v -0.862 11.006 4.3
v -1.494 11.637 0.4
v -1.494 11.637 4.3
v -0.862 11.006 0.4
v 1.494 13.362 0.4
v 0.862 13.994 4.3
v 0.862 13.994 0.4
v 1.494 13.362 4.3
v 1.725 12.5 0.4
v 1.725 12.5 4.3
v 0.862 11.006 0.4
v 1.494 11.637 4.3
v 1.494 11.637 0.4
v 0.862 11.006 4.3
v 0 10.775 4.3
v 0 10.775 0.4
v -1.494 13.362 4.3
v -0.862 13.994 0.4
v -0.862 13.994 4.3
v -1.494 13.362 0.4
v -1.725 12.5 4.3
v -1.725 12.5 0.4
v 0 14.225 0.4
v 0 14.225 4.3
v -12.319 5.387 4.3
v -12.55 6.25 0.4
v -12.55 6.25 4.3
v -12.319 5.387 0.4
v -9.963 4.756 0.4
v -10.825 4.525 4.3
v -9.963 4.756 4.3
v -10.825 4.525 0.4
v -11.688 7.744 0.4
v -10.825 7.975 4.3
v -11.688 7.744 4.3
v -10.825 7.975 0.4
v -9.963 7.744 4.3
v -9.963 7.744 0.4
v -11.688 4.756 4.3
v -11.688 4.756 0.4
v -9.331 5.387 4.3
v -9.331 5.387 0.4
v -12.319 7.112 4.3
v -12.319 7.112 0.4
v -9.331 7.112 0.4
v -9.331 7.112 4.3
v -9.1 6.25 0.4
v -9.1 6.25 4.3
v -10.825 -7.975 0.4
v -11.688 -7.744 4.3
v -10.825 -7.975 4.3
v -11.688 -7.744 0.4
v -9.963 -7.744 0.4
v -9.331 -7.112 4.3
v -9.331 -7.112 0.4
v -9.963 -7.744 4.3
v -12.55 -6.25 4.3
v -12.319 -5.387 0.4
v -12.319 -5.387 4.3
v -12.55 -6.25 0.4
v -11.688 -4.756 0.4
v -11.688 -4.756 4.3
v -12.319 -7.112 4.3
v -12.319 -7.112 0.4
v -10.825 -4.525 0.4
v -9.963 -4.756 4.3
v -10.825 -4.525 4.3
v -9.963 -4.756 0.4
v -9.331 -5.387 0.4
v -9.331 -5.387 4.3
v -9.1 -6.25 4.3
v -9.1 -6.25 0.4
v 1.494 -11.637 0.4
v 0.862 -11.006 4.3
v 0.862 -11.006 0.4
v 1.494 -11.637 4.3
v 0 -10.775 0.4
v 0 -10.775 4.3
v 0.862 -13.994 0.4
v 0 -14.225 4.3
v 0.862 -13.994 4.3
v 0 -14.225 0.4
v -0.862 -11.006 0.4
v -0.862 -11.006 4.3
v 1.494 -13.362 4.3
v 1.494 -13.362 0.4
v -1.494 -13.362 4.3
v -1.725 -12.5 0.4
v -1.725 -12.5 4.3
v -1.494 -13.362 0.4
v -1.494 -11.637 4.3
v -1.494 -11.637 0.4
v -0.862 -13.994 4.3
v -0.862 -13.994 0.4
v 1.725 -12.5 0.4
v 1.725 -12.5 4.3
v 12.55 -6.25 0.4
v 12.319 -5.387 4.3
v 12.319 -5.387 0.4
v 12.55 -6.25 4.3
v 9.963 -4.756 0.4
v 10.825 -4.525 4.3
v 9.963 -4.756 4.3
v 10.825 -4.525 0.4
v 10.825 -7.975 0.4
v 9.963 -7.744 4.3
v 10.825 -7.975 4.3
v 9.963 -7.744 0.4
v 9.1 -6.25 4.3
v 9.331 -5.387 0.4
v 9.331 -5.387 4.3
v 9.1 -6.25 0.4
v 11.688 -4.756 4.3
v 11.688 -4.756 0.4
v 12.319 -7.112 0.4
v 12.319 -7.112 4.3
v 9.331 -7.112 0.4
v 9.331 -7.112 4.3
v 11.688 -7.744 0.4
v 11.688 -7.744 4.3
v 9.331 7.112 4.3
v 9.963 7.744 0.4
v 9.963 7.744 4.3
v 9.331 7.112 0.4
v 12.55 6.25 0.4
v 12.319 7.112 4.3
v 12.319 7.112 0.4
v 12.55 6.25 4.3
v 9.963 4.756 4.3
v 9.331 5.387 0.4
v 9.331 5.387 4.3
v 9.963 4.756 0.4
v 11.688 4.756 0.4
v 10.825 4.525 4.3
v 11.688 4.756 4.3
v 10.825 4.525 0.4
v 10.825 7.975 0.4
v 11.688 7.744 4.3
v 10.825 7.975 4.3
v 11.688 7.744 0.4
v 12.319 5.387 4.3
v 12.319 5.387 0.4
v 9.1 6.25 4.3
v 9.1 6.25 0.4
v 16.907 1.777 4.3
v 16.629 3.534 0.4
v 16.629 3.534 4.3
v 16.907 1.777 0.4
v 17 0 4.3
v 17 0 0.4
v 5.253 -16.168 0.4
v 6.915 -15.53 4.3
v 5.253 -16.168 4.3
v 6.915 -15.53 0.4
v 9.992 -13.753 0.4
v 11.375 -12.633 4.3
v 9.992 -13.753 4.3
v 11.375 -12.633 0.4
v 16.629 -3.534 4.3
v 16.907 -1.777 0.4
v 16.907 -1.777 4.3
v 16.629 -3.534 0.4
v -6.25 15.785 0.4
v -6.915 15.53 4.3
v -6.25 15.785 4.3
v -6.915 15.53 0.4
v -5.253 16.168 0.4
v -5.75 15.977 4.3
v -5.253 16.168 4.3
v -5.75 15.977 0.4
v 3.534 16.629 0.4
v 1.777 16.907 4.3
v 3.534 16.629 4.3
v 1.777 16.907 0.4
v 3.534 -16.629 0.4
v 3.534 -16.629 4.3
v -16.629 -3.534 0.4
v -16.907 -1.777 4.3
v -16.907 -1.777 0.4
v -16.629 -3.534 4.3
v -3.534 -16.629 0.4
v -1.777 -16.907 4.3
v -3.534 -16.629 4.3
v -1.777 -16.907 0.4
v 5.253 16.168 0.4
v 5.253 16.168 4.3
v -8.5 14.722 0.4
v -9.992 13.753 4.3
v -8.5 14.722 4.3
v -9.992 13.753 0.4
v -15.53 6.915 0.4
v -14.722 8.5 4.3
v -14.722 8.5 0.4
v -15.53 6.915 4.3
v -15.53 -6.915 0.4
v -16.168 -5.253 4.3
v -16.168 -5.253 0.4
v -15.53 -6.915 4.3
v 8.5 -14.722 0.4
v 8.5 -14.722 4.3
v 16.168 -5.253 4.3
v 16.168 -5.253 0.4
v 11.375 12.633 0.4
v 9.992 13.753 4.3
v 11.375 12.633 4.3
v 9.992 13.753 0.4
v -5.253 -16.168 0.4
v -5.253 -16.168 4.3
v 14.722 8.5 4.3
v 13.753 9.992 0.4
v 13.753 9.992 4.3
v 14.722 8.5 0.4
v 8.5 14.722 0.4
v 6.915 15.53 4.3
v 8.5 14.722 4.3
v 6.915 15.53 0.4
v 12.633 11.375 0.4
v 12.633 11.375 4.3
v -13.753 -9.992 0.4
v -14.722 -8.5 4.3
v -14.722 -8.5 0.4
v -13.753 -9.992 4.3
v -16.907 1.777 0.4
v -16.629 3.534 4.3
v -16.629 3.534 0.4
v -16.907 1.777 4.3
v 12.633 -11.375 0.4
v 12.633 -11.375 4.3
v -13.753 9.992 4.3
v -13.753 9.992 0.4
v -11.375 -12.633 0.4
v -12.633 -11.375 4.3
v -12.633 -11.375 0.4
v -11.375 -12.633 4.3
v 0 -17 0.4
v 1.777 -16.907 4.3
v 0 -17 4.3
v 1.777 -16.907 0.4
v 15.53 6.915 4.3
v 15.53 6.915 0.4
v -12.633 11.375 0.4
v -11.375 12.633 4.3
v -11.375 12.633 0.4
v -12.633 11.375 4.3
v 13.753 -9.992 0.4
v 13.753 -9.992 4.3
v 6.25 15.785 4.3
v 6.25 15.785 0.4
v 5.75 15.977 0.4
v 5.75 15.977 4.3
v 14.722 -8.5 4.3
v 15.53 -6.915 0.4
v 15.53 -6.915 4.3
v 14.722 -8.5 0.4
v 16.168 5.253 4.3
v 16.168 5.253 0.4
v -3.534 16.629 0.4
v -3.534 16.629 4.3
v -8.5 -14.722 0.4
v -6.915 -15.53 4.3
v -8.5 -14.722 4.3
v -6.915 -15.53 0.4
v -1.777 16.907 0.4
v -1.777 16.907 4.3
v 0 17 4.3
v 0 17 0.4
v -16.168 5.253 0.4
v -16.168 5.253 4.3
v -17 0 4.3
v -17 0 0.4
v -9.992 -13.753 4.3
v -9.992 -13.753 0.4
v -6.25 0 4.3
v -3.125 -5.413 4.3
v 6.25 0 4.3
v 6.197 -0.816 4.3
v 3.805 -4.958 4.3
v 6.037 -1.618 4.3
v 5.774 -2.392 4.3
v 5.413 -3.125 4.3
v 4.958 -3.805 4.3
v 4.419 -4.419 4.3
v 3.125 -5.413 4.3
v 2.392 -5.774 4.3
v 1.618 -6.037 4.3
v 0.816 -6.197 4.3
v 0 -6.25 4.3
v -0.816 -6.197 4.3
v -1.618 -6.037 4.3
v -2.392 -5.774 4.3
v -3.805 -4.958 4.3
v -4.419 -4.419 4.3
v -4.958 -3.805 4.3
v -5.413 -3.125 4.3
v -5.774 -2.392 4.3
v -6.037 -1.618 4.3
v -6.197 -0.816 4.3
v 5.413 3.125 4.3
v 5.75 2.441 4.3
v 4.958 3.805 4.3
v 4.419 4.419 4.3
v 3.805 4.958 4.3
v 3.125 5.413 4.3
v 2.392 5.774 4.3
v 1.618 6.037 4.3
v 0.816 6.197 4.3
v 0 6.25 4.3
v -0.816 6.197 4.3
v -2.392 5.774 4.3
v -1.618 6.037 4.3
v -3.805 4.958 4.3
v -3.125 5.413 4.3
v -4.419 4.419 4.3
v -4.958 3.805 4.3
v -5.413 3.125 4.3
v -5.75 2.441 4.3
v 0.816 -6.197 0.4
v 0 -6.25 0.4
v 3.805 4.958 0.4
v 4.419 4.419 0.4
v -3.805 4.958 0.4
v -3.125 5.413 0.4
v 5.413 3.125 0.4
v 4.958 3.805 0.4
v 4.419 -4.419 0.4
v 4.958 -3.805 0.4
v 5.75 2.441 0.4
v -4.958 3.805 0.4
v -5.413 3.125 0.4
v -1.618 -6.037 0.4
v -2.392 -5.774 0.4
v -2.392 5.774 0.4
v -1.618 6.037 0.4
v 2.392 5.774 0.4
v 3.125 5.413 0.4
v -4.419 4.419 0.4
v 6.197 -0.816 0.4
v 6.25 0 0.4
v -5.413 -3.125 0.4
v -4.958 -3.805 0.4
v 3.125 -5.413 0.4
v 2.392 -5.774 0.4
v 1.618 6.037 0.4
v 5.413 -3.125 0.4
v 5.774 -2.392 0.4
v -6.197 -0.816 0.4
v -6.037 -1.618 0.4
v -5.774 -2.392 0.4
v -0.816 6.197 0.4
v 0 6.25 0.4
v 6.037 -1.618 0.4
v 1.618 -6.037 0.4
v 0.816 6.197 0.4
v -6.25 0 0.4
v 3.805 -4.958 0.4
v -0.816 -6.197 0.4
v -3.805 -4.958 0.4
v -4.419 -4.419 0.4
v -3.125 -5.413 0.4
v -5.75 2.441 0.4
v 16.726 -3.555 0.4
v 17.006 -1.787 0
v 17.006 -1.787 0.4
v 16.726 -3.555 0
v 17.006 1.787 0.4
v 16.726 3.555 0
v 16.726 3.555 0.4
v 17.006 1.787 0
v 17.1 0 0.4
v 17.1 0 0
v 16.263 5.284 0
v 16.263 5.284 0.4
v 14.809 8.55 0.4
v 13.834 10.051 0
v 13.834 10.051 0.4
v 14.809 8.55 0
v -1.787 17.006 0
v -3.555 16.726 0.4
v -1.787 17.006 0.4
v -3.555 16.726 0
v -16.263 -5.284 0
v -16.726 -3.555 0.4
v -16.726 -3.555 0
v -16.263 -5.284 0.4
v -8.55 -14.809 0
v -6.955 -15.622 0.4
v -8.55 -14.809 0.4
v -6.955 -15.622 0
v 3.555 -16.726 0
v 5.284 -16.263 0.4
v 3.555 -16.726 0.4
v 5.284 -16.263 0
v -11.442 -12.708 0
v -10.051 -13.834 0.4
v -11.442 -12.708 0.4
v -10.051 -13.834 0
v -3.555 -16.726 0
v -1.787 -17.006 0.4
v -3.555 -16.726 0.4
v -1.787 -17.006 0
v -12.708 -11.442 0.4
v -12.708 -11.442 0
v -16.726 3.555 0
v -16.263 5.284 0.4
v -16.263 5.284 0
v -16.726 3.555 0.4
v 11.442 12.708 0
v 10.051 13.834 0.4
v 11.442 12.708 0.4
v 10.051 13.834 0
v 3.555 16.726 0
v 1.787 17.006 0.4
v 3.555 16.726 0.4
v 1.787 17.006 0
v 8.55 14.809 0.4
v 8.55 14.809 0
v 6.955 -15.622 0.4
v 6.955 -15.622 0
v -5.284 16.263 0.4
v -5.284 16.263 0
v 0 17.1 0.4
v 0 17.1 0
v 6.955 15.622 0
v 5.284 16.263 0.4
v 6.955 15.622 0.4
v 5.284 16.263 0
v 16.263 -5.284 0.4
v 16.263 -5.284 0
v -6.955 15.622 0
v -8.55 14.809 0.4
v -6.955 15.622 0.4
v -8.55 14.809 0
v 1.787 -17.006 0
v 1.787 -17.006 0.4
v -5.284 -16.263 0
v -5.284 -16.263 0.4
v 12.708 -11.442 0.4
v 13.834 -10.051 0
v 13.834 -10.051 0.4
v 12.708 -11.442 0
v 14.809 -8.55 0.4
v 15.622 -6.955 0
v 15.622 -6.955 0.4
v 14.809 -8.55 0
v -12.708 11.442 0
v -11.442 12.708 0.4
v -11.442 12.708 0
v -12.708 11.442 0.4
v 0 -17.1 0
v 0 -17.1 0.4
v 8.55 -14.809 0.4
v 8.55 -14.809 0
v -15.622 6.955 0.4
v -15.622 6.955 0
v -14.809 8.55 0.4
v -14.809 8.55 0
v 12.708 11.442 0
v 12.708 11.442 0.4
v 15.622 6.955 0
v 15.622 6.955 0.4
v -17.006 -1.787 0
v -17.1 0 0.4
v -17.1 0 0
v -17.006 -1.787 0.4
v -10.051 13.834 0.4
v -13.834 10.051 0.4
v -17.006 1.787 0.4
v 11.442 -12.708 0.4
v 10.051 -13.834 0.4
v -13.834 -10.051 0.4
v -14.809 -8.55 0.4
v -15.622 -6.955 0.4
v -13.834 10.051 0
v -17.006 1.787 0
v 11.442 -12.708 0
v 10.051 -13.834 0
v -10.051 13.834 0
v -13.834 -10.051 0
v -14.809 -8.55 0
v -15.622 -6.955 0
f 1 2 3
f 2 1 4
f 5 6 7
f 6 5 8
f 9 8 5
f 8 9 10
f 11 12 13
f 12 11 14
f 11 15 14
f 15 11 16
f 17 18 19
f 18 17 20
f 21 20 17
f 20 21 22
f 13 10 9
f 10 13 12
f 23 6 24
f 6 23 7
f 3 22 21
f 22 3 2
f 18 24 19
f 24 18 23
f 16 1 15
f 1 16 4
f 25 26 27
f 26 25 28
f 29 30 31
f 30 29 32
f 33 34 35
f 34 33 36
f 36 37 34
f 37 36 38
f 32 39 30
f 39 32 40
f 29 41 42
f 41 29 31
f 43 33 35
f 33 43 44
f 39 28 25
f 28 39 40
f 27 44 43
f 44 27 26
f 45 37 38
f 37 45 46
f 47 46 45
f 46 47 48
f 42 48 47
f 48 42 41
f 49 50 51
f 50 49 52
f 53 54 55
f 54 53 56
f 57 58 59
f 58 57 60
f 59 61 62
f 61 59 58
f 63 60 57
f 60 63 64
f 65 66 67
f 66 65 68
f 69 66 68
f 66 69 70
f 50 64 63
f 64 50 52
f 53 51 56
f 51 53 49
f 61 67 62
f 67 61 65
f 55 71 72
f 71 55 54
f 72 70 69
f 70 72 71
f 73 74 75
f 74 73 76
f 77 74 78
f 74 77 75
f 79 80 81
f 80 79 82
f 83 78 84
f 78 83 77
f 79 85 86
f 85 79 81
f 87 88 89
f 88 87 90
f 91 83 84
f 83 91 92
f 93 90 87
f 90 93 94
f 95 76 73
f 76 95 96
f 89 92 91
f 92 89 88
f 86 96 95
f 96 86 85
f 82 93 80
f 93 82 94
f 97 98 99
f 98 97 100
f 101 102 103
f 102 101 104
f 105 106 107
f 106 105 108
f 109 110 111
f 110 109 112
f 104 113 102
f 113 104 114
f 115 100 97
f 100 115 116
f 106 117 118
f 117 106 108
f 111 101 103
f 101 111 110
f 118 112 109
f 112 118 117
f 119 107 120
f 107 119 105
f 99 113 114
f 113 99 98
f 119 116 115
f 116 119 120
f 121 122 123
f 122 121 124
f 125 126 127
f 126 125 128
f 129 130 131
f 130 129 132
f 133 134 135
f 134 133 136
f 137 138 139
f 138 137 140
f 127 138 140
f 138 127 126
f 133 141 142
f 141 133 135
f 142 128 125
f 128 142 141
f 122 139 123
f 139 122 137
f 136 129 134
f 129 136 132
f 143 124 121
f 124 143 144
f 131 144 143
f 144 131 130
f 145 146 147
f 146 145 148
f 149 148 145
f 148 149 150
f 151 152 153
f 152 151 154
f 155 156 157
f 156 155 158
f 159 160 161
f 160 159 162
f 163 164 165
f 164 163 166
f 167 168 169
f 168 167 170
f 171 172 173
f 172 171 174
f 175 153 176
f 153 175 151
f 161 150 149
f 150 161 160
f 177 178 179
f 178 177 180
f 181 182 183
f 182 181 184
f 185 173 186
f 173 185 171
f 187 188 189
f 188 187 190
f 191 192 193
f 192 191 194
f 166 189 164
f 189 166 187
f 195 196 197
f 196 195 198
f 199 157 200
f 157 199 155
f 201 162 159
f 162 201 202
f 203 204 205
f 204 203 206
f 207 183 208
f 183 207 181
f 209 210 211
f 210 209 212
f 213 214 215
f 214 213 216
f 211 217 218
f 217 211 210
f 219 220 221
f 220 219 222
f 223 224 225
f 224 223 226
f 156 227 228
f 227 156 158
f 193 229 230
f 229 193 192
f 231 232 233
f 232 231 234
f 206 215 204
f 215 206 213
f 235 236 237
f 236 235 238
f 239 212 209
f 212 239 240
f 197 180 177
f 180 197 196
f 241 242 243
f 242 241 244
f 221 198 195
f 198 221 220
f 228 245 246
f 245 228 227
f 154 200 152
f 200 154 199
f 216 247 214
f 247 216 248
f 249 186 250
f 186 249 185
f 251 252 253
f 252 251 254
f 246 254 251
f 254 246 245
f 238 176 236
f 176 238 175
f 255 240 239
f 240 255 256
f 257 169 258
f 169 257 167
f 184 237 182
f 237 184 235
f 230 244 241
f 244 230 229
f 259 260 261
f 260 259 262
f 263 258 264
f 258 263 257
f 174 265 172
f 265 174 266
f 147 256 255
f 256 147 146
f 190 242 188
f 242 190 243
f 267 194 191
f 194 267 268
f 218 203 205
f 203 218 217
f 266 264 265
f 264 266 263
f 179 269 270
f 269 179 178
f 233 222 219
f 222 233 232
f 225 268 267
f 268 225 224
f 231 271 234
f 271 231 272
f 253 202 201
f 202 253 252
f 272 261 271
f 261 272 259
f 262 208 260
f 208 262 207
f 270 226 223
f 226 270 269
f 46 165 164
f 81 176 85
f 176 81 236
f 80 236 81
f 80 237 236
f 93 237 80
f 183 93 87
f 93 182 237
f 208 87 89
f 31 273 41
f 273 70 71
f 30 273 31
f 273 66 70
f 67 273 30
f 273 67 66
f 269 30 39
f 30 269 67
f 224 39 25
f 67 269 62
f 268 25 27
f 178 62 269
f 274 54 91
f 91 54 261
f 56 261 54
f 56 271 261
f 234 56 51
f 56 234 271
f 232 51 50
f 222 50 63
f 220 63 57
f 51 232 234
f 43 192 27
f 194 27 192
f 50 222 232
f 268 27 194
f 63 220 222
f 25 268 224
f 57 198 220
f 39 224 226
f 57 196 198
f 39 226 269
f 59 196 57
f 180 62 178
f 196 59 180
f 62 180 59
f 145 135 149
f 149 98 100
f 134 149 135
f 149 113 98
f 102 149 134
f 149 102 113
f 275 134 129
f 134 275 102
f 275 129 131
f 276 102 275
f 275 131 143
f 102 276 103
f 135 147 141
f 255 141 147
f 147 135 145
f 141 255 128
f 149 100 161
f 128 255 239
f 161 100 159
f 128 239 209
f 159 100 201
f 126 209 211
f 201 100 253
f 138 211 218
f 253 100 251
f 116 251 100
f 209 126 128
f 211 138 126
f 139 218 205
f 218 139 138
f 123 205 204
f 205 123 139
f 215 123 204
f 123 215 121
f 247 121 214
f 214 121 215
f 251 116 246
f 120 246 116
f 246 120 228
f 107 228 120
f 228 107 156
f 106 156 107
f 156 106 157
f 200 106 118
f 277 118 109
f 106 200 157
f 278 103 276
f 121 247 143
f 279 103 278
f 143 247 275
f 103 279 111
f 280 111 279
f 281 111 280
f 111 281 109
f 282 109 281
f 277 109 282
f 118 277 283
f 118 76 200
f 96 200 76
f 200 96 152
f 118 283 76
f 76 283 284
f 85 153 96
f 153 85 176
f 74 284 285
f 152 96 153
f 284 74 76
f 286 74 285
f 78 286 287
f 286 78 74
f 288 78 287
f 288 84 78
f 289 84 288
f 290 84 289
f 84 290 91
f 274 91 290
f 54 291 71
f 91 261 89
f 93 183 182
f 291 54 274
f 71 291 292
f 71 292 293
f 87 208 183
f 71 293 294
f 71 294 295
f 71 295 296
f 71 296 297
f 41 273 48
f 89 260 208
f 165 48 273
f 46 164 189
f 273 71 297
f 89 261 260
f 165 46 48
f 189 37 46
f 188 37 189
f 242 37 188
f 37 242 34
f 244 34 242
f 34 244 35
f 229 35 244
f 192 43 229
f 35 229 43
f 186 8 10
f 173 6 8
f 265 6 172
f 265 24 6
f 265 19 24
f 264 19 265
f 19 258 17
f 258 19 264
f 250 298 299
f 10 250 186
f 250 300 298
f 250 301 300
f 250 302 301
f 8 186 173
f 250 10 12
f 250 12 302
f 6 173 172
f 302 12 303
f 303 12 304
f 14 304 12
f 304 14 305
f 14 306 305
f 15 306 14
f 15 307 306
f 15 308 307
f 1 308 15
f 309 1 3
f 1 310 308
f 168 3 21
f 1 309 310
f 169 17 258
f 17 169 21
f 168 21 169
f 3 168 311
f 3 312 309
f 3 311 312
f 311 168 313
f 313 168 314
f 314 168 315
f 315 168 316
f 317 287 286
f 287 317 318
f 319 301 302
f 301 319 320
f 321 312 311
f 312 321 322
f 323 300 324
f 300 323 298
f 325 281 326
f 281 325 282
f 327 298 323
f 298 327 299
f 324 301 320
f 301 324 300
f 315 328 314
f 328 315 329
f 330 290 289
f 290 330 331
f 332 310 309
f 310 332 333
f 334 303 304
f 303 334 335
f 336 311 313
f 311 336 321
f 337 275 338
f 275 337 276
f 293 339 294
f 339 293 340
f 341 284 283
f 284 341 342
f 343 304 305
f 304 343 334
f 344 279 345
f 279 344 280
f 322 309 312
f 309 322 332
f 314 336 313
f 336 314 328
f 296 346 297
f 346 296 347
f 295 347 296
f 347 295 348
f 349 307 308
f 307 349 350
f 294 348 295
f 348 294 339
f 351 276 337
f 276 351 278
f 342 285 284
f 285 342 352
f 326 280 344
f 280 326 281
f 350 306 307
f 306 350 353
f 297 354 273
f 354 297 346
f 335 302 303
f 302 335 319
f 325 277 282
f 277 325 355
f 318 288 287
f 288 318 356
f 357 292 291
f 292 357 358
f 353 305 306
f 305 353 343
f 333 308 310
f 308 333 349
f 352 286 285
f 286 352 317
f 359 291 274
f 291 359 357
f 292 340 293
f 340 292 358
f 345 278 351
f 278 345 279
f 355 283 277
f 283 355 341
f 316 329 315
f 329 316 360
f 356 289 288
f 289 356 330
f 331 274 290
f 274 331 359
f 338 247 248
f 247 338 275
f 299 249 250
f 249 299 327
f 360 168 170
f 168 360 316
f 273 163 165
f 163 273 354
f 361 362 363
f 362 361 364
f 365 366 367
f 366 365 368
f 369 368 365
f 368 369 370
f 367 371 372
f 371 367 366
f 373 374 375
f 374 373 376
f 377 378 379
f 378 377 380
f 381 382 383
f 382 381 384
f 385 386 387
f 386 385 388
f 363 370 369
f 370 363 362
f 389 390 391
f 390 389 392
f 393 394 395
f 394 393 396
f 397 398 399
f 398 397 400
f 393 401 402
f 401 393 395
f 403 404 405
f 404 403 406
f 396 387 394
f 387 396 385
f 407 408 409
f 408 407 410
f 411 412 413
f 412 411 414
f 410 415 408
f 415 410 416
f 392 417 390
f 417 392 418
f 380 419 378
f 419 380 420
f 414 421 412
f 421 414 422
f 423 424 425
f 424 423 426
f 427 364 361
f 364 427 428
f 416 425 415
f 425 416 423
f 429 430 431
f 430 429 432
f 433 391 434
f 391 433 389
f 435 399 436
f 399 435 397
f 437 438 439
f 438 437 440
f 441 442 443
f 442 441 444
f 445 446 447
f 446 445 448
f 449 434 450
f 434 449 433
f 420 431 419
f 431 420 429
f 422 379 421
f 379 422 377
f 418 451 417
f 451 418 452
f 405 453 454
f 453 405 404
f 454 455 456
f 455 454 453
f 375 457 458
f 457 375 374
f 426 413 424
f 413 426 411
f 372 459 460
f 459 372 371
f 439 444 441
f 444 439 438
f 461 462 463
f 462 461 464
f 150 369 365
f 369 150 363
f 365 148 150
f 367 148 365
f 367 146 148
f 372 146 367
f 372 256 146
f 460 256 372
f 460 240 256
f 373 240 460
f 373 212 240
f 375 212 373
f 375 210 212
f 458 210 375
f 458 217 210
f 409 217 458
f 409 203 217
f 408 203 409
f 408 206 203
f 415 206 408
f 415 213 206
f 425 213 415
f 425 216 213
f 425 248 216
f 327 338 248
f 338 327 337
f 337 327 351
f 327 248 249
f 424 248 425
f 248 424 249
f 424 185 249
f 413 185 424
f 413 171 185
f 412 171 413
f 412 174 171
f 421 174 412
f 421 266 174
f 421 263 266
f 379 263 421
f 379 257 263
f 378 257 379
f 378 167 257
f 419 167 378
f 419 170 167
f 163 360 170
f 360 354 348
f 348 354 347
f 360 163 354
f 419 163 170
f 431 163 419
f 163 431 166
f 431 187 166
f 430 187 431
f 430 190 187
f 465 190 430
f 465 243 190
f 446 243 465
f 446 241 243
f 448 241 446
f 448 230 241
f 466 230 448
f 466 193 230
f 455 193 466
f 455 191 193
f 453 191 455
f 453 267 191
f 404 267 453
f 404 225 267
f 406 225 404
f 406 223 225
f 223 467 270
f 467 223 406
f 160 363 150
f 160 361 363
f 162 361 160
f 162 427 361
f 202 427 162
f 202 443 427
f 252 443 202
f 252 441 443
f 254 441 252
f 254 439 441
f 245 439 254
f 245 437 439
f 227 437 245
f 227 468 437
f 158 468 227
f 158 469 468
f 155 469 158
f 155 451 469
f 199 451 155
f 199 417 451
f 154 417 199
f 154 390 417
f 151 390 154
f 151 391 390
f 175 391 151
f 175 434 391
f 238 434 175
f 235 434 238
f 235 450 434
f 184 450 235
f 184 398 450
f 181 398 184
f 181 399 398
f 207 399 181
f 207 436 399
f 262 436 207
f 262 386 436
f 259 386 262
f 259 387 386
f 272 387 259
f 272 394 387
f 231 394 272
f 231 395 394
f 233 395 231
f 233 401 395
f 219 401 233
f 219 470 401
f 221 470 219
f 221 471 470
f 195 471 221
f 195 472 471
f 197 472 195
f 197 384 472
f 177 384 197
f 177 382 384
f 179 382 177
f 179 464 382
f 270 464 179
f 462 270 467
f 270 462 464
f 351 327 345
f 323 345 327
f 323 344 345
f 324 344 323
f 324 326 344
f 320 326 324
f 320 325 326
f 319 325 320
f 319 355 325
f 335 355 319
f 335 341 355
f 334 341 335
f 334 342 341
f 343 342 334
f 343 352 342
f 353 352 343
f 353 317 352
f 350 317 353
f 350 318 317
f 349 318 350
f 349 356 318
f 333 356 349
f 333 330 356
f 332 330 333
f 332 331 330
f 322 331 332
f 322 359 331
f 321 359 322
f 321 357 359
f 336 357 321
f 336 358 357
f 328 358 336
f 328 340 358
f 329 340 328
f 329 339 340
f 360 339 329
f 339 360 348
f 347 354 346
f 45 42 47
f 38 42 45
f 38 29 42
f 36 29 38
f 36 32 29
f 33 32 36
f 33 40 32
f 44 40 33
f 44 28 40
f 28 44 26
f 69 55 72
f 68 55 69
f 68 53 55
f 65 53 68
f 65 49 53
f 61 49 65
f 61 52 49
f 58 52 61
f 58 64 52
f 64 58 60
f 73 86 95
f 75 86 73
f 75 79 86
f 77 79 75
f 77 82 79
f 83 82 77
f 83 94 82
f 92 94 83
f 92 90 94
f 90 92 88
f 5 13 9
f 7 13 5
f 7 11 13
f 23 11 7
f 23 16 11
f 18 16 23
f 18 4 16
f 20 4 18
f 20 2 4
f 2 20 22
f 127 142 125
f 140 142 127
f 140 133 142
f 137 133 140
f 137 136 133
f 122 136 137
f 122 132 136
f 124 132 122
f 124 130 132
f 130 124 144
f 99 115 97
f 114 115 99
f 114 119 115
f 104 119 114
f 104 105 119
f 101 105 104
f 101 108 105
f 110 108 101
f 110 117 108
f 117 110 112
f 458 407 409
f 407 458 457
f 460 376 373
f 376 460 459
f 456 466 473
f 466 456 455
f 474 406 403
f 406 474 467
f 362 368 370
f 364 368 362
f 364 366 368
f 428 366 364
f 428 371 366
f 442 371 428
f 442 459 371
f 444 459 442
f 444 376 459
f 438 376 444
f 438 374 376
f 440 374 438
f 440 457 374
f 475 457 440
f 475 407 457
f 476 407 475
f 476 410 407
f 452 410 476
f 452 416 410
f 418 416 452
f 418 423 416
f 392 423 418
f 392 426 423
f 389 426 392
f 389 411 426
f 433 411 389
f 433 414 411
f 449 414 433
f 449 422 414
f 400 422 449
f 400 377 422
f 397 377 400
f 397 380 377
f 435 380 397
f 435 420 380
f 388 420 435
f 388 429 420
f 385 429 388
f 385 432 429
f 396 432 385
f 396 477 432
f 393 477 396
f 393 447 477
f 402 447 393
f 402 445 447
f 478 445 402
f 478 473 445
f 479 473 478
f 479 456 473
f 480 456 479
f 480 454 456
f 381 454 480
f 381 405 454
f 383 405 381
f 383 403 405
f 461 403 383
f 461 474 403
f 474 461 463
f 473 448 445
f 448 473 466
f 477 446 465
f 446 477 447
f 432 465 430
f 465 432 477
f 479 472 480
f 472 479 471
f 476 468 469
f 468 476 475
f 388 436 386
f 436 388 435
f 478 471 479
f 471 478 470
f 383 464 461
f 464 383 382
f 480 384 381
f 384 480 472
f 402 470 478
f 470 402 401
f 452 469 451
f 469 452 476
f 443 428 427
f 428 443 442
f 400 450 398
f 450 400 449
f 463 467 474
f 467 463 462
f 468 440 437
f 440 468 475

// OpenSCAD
// file: ChineseHotEnd.scad
module grooveRing(spread) {
radGroove = 12.1/2;
widthGroove = 4.5;
  difference() {
    cylinder(h=widthGroove-1.6*spread,r=10,$fn=24);
    translate([0,0,-.3]) cylinder(h=6,r=radGroove+spread*0.6,$fn=32);
  }
}

module ChineseHotEnd() {
spread = 0.2;
radCyl = 16.12/2;
widthCap = 5.1;
heightNut = 8.5;
diamNut = 10;
  difference() {
    union() {
      translate([0,0,-widthCap]) {
        cylinder(h=40,r=radCyl+spread,$fn=48);
        translate([0,0,-heightNut-.5]) cylinder(h=9.9,r=diamNut/2+spread,$fn=6);
      }

    }
    grooveRing(spread);
  }
}

ChineseHotEnd();
// file: configuration.scad
// Increase this if your slicer or printer make holes too tight.
extra_radius = 0.1;

// OD = outside diameter, corner to corner.
m3_nut_od = 6.1;
m3_nut_radius = m3_nut_od/2 + 0.2 + extra_radius;
m3_washer_radius = 3.5 + extra_radius;

// Major diameter of metric 3mm thread.
m3_major = 2.85;
m3_radius = m3_major/2 + extra_radius;
m3_wide_radius = m3_major/2 + extra_radius + 0.2;

// NEMA17 stepper motors.
motor_shaft_diameter = 5;
motor_shaft_radius = motor_shaft_diameter/2 + extra_radius;

// Frame brackets. M3x8mm screws work best with 3.6 mm brackets.
thickness = 3.6;

// OpenBeam or Misumi. Currently only 15x15 mm, but there is a plan
// to make models more parametric and allow 20x20 mm in the future.
extrusion = 15;

// Placement for the NEMA17 stepper motors.
motor_offset = 44;
motor_length = 47;
// main file
include <configuration.scad>;
use <ChineseHotEnd.scad>;  // as altered for chinese J hot-end


separation = 40;  // Distance between ball joint mounting faces.
offset = 20;  // Same as DELTA_EFFECTOR_OFFSET in Marlin.
mount_radius = 12.5;  // Hotend mounting screws, standard would be 25mm.
hotend_radius = 8;  // Hole for the hotend (J-Head diameter is 16mm).
push_fit_height = 4;  // Length of brass threaded into printed plastic.
height = 8;
cone_r1 = 2.5;
cone_r2 = 14;

module hotEndRetainer() {
radGroove = 12.1/2;
  difference() {
    // groove width is 4.5.  Make a little thinner for "slop" and pad
    cylinder(r=offset-3, h=4, $fn=60);

    translate([0,0,-.1]) cylinder(r=radGroove+.2,h=4.5,$fn=48); 

    for (a = [0:60:359]) rotate([0, 0, a]) {
      translate([0, mount_radius, 0])
	     cylinder(r=m3_wide_radius, h=2*height, center=true, $fn=12);
    }
    translate([ radGroove-.3,0,0]) cube([.5,20,5]);
    translate([-radGroove-.2,0,0]) cube([.5,20,5]);
  }
}

// Shift up and add a brim for easier printing at quelab
union() {
translate([0, 0, .3]) hotEndRetainer();
color("Cyan") {
  cylinder(h=.4,r=17.1,$fn=60);
  }
}
